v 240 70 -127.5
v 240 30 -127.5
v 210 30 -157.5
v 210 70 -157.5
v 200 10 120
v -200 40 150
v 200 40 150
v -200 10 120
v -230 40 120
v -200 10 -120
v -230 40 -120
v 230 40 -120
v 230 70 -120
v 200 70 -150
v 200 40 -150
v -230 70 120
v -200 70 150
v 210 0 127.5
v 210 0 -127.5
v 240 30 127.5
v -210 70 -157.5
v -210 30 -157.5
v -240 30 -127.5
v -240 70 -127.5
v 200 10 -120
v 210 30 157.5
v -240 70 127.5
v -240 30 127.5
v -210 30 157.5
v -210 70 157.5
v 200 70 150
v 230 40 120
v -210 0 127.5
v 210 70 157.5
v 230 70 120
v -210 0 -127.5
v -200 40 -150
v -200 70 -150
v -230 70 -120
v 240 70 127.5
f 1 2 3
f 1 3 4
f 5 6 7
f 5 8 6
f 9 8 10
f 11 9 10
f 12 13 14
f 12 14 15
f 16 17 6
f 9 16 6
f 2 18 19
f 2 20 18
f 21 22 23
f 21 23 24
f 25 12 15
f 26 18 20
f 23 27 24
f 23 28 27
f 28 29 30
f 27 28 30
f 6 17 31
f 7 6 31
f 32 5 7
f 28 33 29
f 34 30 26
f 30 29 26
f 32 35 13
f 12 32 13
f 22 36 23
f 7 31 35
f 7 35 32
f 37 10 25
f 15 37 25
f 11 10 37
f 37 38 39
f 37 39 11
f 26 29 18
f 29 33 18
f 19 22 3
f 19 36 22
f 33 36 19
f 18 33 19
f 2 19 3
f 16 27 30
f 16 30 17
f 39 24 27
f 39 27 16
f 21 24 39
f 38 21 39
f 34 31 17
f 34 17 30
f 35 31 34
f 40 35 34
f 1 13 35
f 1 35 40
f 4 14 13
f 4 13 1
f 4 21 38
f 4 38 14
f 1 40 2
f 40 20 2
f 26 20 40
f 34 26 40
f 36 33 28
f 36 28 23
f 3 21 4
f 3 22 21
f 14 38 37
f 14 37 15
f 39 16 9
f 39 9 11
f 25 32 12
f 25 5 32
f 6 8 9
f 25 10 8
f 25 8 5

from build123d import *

# Parameters (mm, degrees)
SKETCH1_W           = 480
SKETCH1_H           = 315
BOSS_EXTRUDE1_DEPTH = 70
SKETCH3_W           = 460
SKETCH3_H           = 300
CUT_EXTRUDE1_DEPTH  = 60
CHAMFER1_SIZE       = 30


with BuildPart() as part:
    # Sketch1 → Boss-Extrude1 (new body)
    with BuildSketch(Plane(origin=(0, 0, 0), x_dir=(1, 0, 0), z_dir=(0, 1, 0))):
        Rectangle(SKETCH1_W, SKETCH1_H)
    extrude(amount=BOSS_EXTRUDE1_DEPTH)

    # Sketch3 → Cut-Extrude1 (cut)
    with BuildSketch(Plane(origin=(0, 70, 0), x_dir=(1, 0, 0), z_dir=(0, 1, 0))):
        Rectangle(SKETCH3_W, SKETCH3_H)
    extrude(amount=-CUT_EXTRUDE1_DEPTH, mode=Mode.SUBTRACT)

    # Chamfer1
    chamfer1_edges = [part.edges().sort_by_distance(p)[0] for p in [
        (230, 10, 0),
        (230, 40, -150),
        (0, 10, 150),
        (230, 40, 150),
        (-230, 10, 0),
        (-230, 40, 150),
        (0, 10, -150),
        (-230, 40, -150),
        (0, 0, -157.5),
        (240, 0, 0),
        (0, 0, 157.5),
        (-240, 0, 0),
        (-240, 35, -157.5),
        (240, 35, -157.5),
        (240, 35, 157.5),
        (-240, 35, 157.5),
    ]]
    chamfer(chamfer1_edges, length=CHAMFER1_SIZE)


solid = part.part
